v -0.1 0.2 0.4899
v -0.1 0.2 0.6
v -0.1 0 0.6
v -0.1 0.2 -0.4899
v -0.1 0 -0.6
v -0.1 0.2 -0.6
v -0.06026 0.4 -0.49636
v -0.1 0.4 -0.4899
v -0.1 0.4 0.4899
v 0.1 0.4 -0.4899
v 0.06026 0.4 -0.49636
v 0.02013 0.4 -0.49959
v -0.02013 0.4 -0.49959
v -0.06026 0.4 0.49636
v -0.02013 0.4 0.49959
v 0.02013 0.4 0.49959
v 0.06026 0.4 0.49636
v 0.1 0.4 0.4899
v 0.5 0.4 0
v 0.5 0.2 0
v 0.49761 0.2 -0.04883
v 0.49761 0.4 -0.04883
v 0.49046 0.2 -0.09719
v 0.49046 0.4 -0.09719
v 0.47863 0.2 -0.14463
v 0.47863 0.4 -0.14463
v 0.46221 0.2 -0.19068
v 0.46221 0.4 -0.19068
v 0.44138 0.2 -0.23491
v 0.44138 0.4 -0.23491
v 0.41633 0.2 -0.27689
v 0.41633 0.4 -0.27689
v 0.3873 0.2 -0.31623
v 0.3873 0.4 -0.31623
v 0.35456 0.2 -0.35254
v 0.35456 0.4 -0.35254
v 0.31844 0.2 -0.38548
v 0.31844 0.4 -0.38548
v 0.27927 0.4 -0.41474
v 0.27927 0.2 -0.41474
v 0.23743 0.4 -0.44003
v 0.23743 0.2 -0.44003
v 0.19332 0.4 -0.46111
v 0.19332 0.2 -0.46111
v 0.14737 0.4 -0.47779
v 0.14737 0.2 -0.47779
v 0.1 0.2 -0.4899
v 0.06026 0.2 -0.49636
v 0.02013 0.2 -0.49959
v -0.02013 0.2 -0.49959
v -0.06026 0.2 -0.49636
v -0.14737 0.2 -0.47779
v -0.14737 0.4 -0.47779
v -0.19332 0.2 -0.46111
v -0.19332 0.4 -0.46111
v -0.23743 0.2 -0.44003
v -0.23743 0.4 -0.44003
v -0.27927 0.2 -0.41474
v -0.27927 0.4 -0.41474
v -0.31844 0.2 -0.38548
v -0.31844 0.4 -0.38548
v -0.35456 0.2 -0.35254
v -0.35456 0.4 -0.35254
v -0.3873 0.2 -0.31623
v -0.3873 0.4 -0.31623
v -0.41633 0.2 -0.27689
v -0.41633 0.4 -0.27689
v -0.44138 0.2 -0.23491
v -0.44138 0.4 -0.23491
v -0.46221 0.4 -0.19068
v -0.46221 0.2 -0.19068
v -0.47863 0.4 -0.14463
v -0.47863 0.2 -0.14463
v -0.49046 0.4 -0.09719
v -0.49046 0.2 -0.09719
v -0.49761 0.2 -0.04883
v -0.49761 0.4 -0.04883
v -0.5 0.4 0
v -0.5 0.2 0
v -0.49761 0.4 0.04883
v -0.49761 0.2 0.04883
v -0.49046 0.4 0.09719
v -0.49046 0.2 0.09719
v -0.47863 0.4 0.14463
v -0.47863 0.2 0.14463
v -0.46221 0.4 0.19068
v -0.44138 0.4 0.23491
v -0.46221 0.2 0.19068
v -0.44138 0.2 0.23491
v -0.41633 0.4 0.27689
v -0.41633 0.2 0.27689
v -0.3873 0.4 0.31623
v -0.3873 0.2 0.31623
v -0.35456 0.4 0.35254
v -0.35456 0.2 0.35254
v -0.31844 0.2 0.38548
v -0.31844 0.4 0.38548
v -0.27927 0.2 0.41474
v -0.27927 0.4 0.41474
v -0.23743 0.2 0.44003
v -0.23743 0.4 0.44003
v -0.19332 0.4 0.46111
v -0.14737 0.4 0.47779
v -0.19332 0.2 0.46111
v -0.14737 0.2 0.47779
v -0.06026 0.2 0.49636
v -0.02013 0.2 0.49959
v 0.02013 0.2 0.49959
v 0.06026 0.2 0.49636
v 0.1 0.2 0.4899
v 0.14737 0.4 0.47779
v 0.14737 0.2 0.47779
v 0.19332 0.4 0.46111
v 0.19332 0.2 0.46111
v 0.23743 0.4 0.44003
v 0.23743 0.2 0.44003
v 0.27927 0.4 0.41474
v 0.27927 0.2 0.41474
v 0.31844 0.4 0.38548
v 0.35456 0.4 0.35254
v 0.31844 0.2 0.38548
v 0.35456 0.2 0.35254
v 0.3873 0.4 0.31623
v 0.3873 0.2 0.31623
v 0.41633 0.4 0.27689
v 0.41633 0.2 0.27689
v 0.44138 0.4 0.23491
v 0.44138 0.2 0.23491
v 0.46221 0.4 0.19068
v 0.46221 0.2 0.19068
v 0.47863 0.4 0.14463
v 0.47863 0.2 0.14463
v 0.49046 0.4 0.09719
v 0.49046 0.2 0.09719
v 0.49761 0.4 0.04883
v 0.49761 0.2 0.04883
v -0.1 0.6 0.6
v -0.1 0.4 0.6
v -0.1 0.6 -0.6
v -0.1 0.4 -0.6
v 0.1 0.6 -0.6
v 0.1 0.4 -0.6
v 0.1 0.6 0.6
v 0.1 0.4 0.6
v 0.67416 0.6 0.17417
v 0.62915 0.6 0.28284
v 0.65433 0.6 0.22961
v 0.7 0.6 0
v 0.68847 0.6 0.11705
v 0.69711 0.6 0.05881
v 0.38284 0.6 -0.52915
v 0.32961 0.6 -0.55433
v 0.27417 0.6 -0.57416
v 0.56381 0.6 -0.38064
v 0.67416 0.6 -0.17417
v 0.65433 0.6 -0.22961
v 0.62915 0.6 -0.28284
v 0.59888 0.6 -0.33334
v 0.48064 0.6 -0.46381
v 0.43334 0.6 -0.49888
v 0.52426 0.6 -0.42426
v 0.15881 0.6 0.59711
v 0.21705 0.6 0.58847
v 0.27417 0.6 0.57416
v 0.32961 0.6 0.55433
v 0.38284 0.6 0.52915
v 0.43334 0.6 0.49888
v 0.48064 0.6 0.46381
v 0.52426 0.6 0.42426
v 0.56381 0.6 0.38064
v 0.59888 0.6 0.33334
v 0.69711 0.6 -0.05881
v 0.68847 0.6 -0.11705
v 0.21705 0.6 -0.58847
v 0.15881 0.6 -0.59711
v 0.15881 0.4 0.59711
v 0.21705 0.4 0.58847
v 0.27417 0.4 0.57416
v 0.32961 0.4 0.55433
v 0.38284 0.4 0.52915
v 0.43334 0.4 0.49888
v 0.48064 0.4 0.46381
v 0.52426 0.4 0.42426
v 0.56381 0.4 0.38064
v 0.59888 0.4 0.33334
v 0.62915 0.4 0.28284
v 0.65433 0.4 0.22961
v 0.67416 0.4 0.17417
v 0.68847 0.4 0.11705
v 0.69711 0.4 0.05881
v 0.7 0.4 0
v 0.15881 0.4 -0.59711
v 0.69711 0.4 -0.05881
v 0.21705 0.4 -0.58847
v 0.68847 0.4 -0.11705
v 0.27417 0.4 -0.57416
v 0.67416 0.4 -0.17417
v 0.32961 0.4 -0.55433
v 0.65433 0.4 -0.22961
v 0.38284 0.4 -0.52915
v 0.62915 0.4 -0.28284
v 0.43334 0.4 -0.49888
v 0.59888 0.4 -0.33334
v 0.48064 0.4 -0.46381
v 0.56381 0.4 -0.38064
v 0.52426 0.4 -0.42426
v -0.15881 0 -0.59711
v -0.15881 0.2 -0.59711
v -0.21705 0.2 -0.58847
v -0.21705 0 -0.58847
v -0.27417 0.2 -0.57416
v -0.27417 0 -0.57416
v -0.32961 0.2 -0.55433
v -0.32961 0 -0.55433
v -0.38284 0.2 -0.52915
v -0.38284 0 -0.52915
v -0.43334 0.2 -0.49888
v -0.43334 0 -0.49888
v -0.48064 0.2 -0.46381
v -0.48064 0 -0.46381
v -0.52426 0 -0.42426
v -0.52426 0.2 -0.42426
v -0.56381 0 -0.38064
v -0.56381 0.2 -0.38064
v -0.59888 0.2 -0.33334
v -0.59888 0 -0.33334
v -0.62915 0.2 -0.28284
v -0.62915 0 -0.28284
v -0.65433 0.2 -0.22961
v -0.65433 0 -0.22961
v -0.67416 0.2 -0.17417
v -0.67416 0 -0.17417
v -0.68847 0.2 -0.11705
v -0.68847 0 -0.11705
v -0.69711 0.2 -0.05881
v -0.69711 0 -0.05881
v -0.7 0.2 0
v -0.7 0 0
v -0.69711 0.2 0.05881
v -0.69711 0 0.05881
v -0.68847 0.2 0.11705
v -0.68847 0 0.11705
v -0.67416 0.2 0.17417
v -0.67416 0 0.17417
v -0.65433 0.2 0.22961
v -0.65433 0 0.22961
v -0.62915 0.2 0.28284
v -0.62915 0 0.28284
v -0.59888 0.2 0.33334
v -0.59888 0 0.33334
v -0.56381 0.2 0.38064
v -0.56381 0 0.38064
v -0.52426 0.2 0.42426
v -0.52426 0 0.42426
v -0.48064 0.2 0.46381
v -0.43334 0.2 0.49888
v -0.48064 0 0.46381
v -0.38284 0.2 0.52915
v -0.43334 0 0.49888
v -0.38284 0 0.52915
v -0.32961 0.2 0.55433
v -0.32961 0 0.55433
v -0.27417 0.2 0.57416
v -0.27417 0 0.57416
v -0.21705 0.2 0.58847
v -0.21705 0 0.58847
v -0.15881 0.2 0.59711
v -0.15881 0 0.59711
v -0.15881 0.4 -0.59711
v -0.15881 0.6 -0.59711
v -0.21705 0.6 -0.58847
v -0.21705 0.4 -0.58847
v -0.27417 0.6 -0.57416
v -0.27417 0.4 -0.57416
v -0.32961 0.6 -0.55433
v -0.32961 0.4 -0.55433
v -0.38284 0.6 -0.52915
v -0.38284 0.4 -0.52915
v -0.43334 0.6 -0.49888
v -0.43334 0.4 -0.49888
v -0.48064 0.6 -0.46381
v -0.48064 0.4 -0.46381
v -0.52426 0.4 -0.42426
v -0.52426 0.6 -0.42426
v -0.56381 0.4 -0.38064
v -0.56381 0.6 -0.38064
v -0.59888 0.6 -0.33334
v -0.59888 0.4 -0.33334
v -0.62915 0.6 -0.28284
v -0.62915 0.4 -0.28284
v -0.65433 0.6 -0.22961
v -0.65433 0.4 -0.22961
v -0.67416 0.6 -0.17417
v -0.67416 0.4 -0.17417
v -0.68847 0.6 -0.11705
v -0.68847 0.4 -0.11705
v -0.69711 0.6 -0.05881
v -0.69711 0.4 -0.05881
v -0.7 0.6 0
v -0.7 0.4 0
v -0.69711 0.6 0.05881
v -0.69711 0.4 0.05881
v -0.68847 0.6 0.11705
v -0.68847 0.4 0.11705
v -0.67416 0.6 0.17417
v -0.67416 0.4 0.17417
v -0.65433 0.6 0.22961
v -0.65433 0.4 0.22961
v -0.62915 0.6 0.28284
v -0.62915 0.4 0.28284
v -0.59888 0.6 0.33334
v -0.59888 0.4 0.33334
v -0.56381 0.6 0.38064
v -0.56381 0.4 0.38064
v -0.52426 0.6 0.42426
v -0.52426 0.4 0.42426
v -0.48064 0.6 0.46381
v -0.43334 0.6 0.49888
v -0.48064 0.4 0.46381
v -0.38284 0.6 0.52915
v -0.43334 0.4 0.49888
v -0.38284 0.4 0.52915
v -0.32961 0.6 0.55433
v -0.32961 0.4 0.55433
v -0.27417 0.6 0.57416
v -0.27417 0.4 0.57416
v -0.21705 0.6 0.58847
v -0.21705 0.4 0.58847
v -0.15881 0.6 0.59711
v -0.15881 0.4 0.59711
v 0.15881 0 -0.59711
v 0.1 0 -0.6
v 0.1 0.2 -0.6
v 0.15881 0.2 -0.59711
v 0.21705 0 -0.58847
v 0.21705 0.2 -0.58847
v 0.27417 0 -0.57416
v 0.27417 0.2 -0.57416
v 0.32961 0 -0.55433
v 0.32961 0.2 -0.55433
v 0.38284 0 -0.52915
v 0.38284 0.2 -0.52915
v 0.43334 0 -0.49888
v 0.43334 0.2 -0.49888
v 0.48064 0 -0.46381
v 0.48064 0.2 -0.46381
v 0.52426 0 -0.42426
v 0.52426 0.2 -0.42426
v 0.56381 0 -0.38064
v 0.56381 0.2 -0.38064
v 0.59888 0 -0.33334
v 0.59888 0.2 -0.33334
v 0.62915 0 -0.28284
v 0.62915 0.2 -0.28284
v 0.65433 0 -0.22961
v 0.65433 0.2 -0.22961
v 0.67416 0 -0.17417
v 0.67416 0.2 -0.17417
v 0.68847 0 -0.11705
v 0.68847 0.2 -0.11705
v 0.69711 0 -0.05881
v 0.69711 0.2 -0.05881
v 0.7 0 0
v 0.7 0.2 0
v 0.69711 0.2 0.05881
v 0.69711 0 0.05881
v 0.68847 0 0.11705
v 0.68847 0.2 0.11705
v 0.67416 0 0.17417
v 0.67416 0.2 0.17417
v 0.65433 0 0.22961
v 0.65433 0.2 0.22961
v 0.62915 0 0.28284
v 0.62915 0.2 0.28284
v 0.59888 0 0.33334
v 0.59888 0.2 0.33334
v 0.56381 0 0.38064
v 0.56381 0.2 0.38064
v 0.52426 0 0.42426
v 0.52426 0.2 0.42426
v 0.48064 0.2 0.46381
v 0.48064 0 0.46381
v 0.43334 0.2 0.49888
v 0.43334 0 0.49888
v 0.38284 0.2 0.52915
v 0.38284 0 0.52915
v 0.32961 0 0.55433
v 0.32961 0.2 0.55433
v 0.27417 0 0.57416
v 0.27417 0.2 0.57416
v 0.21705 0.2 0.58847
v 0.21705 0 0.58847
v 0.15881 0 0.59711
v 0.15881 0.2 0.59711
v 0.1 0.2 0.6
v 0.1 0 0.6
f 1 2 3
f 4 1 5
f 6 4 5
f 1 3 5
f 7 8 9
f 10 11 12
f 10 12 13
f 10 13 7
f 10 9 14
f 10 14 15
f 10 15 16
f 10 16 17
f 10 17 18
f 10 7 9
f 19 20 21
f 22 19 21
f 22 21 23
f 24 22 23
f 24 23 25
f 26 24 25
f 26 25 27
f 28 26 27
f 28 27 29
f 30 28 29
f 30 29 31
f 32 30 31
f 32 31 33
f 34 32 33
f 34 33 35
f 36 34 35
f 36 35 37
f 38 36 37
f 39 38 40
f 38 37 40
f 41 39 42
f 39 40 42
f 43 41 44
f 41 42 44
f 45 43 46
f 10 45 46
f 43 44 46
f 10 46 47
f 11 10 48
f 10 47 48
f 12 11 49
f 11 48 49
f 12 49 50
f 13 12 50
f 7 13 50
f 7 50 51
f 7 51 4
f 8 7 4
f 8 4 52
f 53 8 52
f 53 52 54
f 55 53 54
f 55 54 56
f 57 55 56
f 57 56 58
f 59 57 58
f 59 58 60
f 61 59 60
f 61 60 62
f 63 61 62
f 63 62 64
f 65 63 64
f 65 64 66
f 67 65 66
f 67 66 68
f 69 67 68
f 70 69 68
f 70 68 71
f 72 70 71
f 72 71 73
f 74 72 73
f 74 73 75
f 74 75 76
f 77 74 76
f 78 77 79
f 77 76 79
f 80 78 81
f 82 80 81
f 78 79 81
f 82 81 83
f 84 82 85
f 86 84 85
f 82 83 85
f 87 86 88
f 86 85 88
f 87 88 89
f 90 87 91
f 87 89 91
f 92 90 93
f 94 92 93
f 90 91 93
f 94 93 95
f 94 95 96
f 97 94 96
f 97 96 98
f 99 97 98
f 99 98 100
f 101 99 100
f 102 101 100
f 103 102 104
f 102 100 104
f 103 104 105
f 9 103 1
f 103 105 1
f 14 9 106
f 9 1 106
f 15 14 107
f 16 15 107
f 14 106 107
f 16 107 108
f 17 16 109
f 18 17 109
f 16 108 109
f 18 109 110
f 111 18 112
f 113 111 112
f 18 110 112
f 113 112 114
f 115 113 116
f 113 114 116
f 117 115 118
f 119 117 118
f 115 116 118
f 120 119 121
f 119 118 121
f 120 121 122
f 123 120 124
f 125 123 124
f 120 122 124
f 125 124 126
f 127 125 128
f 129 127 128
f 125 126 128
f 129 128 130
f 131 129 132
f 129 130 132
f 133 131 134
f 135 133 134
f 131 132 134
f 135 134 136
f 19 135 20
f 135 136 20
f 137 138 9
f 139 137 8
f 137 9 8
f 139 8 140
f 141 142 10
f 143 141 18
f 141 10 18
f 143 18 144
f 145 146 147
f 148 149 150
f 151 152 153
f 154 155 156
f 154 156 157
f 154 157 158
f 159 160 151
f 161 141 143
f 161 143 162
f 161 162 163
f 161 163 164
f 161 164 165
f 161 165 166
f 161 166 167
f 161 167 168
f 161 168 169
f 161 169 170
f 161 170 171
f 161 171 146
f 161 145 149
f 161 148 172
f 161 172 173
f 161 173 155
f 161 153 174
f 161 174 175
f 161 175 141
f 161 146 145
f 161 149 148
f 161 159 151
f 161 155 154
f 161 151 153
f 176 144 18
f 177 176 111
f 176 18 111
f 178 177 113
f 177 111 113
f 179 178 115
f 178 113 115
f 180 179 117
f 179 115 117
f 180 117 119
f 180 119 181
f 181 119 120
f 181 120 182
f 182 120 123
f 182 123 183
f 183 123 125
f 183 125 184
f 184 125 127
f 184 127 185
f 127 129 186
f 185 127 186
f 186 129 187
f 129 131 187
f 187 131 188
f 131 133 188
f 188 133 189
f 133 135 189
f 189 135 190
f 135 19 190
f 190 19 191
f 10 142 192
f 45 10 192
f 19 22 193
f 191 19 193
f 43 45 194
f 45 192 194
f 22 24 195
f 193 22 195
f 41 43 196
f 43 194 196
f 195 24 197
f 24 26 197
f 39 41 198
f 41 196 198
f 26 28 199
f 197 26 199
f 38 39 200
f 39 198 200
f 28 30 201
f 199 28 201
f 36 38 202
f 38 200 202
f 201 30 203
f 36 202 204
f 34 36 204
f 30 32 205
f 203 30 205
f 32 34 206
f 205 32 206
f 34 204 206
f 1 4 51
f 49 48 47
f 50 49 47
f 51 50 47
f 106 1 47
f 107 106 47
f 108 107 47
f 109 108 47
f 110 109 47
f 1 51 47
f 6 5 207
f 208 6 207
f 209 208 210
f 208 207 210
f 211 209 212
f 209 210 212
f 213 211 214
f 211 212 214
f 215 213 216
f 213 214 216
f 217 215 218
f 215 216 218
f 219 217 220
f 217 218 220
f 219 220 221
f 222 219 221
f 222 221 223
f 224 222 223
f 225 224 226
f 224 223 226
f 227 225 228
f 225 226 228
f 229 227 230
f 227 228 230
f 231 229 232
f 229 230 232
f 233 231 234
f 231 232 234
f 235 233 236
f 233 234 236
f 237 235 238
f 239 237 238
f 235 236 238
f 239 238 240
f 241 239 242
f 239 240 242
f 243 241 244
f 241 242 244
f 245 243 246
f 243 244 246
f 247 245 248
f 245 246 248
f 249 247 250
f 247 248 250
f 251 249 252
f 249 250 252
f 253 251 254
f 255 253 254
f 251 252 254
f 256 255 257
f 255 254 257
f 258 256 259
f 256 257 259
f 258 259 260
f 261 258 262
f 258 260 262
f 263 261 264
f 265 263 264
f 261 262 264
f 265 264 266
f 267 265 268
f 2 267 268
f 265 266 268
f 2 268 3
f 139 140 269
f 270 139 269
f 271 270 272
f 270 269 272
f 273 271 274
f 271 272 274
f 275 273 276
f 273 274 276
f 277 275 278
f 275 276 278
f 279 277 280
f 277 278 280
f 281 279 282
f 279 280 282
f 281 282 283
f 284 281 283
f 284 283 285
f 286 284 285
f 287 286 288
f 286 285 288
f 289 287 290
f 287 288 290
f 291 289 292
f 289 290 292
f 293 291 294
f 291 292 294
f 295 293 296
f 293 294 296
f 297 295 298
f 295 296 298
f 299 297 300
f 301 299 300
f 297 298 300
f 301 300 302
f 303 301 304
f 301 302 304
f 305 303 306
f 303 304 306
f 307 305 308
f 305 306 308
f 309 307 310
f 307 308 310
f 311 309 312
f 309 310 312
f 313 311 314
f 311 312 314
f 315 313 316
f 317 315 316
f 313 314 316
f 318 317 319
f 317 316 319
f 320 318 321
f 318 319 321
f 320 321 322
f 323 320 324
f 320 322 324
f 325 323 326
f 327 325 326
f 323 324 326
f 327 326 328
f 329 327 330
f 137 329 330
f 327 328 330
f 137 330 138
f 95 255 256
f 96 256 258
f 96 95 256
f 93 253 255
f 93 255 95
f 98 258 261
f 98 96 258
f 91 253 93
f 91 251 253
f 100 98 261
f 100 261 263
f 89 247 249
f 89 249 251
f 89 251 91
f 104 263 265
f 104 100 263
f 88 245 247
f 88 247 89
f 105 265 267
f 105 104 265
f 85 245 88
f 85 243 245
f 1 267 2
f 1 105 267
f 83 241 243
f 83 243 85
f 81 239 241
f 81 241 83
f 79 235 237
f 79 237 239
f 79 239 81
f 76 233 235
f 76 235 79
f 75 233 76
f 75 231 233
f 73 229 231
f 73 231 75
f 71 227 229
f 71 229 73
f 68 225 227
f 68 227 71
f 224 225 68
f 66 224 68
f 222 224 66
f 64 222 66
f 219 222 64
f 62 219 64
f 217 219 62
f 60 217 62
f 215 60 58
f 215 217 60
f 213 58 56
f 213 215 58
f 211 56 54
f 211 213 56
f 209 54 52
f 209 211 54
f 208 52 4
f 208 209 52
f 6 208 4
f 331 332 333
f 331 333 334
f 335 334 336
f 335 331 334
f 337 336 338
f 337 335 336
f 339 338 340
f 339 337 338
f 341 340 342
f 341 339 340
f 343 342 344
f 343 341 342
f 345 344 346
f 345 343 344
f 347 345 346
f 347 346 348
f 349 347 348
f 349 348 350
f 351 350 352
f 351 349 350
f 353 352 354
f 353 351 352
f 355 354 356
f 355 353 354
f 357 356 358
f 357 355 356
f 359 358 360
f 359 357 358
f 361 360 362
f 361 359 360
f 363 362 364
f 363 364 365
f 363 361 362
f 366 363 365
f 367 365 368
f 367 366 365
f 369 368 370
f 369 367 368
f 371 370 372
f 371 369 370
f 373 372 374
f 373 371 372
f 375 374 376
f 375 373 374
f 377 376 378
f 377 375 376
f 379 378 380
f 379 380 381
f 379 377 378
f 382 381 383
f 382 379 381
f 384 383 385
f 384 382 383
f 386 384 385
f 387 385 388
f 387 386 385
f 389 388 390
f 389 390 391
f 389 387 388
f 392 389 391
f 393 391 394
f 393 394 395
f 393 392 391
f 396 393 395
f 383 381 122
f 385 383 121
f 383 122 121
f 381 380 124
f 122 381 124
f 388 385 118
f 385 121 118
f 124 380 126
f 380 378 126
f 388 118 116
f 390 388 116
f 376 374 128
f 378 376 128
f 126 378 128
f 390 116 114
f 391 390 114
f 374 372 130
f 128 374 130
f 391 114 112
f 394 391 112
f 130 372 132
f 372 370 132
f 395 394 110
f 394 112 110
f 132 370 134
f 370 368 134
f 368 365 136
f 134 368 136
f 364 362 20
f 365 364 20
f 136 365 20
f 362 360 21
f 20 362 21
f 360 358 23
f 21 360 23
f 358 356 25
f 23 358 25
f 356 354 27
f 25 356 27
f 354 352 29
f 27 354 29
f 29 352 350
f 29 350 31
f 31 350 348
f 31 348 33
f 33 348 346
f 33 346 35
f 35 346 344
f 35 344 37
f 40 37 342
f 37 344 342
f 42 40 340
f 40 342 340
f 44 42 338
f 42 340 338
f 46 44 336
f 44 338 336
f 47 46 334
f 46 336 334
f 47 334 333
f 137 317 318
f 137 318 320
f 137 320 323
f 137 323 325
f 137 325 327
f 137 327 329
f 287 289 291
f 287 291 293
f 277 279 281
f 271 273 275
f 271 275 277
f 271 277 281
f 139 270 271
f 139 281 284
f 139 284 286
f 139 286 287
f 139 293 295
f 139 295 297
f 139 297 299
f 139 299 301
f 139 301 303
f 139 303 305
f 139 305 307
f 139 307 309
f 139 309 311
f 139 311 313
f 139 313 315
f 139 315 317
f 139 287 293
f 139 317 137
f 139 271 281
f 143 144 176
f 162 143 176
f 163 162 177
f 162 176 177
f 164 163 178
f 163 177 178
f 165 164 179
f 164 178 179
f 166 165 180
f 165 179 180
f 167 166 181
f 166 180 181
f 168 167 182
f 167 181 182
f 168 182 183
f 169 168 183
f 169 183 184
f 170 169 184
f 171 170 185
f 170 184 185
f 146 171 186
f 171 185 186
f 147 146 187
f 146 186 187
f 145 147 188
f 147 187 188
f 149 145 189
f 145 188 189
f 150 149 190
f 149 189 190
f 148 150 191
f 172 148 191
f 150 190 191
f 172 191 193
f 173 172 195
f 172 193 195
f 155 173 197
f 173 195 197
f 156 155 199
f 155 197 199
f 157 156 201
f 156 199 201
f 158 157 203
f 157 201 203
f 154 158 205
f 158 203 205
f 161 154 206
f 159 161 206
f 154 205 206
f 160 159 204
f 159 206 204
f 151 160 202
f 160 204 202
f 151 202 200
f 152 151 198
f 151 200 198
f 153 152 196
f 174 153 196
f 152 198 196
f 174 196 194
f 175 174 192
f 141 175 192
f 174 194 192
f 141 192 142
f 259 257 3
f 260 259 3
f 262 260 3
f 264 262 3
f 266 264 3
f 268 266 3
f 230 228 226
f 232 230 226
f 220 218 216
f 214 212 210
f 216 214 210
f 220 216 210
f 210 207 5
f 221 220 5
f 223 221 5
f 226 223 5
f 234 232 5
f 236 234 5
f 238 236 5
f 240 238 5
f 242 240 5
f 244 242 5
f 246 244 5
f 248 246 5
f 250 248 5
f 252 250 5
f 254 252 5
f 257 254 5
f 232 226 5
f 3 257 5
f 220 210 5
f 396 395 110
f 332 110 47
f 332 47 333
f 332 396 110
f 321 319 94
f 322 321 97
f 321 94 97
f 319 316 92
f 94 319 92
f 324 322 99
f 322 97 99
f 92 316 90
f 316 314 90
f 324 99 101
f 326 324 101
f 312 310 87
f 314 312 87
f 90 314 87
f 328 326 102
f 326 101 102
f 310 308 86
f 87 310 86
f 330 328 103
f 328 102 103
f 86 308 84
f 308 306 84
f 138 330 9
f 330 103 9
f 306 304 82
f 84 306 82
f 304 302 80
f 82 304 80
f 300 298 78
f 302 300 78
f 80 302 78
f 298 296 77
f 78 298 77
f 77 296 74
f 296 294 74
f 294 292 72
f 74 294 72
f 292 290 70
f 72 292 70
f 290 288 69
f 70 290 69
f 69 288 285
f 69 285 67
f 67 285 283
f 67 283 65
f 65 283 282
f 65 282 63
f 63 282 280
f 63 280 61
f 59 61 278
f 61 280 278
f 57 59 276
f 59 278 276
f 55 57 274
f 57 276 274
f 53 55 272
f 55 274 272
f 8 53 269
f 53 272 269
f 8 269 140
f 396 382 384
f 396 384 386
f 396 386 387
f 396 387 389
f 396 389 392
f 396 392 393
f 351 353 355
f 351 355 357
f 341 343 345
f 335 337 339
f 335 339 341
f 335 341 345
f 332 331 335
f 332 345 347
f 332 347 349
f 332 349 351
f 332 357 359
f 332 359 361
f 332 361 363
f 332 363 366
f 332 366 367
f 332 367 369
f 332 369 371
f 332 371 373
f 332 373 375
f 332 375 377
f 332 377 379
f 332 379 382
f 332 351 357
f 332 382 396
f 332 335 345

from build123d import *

# Parameters (mm, degrees)
BOSS_EXTRUDE1_DEPTH   = 0.2
BOSS_EXTRUDE1_2_DEPTH = 0.2
SKETCH2_R             = 0.5
BOSS_EXTRUDE2_DEPTH   = 0.2
BOSS_EXTRUDE3_DEPTH   = 0.2


with BuildPart() as part:
    # Sketch1 → Boss-Extrude1 (new body)
    with BuildSketch(Plane(origin=(0, 0, 0), x_dir=(1, 0, 0), z_dir=(0, 1, 0))):
        with BuildLine():
            Line((0.1, -0.6), (0.1, 0.6))
            ThreePointArc((0.1, 0.6), (0.7, 0), (0.1, -0.6))
        make_face()
    extrude(amount=BOSS_EXTRUDE1_DEPTH)



with BuildPart() as body_2:
    # Sketch1 → Boss-Extrude1 2 (new body)
    with BuildSketch(Plane(origin=(0, 0, 0), x_dir=(1, 0, 0), z_dir=(0, 1, 0))):
        with BuildLine():
            Line((-0.1, -0.6), (-0.1, 0.6))
            ThreePointArc((-0.1, 0.6), (-0.7, 0), (-0.1, -0.6))
        make_face()
    extrude(amount=BOSS_EXTRUDE1_2_DEPTH)


with BuildPart() as part_1:
    add(part.part)

    add(body_2.part)  # Boss-Extrude2 merges body 2
    # Sketch2 → Boss-Extrude2 (add)
    with BuildSketch(Plane(origin=(0, 0.2, 0), x_dir=(1, 0, 0), z_dir=(0, 1, 0))):
        Circle(SKETCH2_R)
    extrude(amount=BOSS_EXTRUDE2_DEPTH)

    # Sketch3 → Boss-Extrude3 (add)
    with BuildSketch(Plane(origin=(0, 0.4, 0), x_dir=(1, 0, 0), z_dir=(0, 1, 0))):
        with BuildLine():
            Line((-0.1, -0.6), (-0.1, 0.6))
            ThreePointArc((-0.1, 0.6), (-0.7, 0), (-0.1, -0.6))
        make_face()
        with BuildLine():
            Line((0.1, 0.6), (0.1, -0.6))
            ThreePointArc((0.1, -0.6), (0.7, 0), (0.1, 0.6))
        make_face()
    extrude(amount=BOSS_EXTRUDE3_DEPTH)


solid = part_1.part
